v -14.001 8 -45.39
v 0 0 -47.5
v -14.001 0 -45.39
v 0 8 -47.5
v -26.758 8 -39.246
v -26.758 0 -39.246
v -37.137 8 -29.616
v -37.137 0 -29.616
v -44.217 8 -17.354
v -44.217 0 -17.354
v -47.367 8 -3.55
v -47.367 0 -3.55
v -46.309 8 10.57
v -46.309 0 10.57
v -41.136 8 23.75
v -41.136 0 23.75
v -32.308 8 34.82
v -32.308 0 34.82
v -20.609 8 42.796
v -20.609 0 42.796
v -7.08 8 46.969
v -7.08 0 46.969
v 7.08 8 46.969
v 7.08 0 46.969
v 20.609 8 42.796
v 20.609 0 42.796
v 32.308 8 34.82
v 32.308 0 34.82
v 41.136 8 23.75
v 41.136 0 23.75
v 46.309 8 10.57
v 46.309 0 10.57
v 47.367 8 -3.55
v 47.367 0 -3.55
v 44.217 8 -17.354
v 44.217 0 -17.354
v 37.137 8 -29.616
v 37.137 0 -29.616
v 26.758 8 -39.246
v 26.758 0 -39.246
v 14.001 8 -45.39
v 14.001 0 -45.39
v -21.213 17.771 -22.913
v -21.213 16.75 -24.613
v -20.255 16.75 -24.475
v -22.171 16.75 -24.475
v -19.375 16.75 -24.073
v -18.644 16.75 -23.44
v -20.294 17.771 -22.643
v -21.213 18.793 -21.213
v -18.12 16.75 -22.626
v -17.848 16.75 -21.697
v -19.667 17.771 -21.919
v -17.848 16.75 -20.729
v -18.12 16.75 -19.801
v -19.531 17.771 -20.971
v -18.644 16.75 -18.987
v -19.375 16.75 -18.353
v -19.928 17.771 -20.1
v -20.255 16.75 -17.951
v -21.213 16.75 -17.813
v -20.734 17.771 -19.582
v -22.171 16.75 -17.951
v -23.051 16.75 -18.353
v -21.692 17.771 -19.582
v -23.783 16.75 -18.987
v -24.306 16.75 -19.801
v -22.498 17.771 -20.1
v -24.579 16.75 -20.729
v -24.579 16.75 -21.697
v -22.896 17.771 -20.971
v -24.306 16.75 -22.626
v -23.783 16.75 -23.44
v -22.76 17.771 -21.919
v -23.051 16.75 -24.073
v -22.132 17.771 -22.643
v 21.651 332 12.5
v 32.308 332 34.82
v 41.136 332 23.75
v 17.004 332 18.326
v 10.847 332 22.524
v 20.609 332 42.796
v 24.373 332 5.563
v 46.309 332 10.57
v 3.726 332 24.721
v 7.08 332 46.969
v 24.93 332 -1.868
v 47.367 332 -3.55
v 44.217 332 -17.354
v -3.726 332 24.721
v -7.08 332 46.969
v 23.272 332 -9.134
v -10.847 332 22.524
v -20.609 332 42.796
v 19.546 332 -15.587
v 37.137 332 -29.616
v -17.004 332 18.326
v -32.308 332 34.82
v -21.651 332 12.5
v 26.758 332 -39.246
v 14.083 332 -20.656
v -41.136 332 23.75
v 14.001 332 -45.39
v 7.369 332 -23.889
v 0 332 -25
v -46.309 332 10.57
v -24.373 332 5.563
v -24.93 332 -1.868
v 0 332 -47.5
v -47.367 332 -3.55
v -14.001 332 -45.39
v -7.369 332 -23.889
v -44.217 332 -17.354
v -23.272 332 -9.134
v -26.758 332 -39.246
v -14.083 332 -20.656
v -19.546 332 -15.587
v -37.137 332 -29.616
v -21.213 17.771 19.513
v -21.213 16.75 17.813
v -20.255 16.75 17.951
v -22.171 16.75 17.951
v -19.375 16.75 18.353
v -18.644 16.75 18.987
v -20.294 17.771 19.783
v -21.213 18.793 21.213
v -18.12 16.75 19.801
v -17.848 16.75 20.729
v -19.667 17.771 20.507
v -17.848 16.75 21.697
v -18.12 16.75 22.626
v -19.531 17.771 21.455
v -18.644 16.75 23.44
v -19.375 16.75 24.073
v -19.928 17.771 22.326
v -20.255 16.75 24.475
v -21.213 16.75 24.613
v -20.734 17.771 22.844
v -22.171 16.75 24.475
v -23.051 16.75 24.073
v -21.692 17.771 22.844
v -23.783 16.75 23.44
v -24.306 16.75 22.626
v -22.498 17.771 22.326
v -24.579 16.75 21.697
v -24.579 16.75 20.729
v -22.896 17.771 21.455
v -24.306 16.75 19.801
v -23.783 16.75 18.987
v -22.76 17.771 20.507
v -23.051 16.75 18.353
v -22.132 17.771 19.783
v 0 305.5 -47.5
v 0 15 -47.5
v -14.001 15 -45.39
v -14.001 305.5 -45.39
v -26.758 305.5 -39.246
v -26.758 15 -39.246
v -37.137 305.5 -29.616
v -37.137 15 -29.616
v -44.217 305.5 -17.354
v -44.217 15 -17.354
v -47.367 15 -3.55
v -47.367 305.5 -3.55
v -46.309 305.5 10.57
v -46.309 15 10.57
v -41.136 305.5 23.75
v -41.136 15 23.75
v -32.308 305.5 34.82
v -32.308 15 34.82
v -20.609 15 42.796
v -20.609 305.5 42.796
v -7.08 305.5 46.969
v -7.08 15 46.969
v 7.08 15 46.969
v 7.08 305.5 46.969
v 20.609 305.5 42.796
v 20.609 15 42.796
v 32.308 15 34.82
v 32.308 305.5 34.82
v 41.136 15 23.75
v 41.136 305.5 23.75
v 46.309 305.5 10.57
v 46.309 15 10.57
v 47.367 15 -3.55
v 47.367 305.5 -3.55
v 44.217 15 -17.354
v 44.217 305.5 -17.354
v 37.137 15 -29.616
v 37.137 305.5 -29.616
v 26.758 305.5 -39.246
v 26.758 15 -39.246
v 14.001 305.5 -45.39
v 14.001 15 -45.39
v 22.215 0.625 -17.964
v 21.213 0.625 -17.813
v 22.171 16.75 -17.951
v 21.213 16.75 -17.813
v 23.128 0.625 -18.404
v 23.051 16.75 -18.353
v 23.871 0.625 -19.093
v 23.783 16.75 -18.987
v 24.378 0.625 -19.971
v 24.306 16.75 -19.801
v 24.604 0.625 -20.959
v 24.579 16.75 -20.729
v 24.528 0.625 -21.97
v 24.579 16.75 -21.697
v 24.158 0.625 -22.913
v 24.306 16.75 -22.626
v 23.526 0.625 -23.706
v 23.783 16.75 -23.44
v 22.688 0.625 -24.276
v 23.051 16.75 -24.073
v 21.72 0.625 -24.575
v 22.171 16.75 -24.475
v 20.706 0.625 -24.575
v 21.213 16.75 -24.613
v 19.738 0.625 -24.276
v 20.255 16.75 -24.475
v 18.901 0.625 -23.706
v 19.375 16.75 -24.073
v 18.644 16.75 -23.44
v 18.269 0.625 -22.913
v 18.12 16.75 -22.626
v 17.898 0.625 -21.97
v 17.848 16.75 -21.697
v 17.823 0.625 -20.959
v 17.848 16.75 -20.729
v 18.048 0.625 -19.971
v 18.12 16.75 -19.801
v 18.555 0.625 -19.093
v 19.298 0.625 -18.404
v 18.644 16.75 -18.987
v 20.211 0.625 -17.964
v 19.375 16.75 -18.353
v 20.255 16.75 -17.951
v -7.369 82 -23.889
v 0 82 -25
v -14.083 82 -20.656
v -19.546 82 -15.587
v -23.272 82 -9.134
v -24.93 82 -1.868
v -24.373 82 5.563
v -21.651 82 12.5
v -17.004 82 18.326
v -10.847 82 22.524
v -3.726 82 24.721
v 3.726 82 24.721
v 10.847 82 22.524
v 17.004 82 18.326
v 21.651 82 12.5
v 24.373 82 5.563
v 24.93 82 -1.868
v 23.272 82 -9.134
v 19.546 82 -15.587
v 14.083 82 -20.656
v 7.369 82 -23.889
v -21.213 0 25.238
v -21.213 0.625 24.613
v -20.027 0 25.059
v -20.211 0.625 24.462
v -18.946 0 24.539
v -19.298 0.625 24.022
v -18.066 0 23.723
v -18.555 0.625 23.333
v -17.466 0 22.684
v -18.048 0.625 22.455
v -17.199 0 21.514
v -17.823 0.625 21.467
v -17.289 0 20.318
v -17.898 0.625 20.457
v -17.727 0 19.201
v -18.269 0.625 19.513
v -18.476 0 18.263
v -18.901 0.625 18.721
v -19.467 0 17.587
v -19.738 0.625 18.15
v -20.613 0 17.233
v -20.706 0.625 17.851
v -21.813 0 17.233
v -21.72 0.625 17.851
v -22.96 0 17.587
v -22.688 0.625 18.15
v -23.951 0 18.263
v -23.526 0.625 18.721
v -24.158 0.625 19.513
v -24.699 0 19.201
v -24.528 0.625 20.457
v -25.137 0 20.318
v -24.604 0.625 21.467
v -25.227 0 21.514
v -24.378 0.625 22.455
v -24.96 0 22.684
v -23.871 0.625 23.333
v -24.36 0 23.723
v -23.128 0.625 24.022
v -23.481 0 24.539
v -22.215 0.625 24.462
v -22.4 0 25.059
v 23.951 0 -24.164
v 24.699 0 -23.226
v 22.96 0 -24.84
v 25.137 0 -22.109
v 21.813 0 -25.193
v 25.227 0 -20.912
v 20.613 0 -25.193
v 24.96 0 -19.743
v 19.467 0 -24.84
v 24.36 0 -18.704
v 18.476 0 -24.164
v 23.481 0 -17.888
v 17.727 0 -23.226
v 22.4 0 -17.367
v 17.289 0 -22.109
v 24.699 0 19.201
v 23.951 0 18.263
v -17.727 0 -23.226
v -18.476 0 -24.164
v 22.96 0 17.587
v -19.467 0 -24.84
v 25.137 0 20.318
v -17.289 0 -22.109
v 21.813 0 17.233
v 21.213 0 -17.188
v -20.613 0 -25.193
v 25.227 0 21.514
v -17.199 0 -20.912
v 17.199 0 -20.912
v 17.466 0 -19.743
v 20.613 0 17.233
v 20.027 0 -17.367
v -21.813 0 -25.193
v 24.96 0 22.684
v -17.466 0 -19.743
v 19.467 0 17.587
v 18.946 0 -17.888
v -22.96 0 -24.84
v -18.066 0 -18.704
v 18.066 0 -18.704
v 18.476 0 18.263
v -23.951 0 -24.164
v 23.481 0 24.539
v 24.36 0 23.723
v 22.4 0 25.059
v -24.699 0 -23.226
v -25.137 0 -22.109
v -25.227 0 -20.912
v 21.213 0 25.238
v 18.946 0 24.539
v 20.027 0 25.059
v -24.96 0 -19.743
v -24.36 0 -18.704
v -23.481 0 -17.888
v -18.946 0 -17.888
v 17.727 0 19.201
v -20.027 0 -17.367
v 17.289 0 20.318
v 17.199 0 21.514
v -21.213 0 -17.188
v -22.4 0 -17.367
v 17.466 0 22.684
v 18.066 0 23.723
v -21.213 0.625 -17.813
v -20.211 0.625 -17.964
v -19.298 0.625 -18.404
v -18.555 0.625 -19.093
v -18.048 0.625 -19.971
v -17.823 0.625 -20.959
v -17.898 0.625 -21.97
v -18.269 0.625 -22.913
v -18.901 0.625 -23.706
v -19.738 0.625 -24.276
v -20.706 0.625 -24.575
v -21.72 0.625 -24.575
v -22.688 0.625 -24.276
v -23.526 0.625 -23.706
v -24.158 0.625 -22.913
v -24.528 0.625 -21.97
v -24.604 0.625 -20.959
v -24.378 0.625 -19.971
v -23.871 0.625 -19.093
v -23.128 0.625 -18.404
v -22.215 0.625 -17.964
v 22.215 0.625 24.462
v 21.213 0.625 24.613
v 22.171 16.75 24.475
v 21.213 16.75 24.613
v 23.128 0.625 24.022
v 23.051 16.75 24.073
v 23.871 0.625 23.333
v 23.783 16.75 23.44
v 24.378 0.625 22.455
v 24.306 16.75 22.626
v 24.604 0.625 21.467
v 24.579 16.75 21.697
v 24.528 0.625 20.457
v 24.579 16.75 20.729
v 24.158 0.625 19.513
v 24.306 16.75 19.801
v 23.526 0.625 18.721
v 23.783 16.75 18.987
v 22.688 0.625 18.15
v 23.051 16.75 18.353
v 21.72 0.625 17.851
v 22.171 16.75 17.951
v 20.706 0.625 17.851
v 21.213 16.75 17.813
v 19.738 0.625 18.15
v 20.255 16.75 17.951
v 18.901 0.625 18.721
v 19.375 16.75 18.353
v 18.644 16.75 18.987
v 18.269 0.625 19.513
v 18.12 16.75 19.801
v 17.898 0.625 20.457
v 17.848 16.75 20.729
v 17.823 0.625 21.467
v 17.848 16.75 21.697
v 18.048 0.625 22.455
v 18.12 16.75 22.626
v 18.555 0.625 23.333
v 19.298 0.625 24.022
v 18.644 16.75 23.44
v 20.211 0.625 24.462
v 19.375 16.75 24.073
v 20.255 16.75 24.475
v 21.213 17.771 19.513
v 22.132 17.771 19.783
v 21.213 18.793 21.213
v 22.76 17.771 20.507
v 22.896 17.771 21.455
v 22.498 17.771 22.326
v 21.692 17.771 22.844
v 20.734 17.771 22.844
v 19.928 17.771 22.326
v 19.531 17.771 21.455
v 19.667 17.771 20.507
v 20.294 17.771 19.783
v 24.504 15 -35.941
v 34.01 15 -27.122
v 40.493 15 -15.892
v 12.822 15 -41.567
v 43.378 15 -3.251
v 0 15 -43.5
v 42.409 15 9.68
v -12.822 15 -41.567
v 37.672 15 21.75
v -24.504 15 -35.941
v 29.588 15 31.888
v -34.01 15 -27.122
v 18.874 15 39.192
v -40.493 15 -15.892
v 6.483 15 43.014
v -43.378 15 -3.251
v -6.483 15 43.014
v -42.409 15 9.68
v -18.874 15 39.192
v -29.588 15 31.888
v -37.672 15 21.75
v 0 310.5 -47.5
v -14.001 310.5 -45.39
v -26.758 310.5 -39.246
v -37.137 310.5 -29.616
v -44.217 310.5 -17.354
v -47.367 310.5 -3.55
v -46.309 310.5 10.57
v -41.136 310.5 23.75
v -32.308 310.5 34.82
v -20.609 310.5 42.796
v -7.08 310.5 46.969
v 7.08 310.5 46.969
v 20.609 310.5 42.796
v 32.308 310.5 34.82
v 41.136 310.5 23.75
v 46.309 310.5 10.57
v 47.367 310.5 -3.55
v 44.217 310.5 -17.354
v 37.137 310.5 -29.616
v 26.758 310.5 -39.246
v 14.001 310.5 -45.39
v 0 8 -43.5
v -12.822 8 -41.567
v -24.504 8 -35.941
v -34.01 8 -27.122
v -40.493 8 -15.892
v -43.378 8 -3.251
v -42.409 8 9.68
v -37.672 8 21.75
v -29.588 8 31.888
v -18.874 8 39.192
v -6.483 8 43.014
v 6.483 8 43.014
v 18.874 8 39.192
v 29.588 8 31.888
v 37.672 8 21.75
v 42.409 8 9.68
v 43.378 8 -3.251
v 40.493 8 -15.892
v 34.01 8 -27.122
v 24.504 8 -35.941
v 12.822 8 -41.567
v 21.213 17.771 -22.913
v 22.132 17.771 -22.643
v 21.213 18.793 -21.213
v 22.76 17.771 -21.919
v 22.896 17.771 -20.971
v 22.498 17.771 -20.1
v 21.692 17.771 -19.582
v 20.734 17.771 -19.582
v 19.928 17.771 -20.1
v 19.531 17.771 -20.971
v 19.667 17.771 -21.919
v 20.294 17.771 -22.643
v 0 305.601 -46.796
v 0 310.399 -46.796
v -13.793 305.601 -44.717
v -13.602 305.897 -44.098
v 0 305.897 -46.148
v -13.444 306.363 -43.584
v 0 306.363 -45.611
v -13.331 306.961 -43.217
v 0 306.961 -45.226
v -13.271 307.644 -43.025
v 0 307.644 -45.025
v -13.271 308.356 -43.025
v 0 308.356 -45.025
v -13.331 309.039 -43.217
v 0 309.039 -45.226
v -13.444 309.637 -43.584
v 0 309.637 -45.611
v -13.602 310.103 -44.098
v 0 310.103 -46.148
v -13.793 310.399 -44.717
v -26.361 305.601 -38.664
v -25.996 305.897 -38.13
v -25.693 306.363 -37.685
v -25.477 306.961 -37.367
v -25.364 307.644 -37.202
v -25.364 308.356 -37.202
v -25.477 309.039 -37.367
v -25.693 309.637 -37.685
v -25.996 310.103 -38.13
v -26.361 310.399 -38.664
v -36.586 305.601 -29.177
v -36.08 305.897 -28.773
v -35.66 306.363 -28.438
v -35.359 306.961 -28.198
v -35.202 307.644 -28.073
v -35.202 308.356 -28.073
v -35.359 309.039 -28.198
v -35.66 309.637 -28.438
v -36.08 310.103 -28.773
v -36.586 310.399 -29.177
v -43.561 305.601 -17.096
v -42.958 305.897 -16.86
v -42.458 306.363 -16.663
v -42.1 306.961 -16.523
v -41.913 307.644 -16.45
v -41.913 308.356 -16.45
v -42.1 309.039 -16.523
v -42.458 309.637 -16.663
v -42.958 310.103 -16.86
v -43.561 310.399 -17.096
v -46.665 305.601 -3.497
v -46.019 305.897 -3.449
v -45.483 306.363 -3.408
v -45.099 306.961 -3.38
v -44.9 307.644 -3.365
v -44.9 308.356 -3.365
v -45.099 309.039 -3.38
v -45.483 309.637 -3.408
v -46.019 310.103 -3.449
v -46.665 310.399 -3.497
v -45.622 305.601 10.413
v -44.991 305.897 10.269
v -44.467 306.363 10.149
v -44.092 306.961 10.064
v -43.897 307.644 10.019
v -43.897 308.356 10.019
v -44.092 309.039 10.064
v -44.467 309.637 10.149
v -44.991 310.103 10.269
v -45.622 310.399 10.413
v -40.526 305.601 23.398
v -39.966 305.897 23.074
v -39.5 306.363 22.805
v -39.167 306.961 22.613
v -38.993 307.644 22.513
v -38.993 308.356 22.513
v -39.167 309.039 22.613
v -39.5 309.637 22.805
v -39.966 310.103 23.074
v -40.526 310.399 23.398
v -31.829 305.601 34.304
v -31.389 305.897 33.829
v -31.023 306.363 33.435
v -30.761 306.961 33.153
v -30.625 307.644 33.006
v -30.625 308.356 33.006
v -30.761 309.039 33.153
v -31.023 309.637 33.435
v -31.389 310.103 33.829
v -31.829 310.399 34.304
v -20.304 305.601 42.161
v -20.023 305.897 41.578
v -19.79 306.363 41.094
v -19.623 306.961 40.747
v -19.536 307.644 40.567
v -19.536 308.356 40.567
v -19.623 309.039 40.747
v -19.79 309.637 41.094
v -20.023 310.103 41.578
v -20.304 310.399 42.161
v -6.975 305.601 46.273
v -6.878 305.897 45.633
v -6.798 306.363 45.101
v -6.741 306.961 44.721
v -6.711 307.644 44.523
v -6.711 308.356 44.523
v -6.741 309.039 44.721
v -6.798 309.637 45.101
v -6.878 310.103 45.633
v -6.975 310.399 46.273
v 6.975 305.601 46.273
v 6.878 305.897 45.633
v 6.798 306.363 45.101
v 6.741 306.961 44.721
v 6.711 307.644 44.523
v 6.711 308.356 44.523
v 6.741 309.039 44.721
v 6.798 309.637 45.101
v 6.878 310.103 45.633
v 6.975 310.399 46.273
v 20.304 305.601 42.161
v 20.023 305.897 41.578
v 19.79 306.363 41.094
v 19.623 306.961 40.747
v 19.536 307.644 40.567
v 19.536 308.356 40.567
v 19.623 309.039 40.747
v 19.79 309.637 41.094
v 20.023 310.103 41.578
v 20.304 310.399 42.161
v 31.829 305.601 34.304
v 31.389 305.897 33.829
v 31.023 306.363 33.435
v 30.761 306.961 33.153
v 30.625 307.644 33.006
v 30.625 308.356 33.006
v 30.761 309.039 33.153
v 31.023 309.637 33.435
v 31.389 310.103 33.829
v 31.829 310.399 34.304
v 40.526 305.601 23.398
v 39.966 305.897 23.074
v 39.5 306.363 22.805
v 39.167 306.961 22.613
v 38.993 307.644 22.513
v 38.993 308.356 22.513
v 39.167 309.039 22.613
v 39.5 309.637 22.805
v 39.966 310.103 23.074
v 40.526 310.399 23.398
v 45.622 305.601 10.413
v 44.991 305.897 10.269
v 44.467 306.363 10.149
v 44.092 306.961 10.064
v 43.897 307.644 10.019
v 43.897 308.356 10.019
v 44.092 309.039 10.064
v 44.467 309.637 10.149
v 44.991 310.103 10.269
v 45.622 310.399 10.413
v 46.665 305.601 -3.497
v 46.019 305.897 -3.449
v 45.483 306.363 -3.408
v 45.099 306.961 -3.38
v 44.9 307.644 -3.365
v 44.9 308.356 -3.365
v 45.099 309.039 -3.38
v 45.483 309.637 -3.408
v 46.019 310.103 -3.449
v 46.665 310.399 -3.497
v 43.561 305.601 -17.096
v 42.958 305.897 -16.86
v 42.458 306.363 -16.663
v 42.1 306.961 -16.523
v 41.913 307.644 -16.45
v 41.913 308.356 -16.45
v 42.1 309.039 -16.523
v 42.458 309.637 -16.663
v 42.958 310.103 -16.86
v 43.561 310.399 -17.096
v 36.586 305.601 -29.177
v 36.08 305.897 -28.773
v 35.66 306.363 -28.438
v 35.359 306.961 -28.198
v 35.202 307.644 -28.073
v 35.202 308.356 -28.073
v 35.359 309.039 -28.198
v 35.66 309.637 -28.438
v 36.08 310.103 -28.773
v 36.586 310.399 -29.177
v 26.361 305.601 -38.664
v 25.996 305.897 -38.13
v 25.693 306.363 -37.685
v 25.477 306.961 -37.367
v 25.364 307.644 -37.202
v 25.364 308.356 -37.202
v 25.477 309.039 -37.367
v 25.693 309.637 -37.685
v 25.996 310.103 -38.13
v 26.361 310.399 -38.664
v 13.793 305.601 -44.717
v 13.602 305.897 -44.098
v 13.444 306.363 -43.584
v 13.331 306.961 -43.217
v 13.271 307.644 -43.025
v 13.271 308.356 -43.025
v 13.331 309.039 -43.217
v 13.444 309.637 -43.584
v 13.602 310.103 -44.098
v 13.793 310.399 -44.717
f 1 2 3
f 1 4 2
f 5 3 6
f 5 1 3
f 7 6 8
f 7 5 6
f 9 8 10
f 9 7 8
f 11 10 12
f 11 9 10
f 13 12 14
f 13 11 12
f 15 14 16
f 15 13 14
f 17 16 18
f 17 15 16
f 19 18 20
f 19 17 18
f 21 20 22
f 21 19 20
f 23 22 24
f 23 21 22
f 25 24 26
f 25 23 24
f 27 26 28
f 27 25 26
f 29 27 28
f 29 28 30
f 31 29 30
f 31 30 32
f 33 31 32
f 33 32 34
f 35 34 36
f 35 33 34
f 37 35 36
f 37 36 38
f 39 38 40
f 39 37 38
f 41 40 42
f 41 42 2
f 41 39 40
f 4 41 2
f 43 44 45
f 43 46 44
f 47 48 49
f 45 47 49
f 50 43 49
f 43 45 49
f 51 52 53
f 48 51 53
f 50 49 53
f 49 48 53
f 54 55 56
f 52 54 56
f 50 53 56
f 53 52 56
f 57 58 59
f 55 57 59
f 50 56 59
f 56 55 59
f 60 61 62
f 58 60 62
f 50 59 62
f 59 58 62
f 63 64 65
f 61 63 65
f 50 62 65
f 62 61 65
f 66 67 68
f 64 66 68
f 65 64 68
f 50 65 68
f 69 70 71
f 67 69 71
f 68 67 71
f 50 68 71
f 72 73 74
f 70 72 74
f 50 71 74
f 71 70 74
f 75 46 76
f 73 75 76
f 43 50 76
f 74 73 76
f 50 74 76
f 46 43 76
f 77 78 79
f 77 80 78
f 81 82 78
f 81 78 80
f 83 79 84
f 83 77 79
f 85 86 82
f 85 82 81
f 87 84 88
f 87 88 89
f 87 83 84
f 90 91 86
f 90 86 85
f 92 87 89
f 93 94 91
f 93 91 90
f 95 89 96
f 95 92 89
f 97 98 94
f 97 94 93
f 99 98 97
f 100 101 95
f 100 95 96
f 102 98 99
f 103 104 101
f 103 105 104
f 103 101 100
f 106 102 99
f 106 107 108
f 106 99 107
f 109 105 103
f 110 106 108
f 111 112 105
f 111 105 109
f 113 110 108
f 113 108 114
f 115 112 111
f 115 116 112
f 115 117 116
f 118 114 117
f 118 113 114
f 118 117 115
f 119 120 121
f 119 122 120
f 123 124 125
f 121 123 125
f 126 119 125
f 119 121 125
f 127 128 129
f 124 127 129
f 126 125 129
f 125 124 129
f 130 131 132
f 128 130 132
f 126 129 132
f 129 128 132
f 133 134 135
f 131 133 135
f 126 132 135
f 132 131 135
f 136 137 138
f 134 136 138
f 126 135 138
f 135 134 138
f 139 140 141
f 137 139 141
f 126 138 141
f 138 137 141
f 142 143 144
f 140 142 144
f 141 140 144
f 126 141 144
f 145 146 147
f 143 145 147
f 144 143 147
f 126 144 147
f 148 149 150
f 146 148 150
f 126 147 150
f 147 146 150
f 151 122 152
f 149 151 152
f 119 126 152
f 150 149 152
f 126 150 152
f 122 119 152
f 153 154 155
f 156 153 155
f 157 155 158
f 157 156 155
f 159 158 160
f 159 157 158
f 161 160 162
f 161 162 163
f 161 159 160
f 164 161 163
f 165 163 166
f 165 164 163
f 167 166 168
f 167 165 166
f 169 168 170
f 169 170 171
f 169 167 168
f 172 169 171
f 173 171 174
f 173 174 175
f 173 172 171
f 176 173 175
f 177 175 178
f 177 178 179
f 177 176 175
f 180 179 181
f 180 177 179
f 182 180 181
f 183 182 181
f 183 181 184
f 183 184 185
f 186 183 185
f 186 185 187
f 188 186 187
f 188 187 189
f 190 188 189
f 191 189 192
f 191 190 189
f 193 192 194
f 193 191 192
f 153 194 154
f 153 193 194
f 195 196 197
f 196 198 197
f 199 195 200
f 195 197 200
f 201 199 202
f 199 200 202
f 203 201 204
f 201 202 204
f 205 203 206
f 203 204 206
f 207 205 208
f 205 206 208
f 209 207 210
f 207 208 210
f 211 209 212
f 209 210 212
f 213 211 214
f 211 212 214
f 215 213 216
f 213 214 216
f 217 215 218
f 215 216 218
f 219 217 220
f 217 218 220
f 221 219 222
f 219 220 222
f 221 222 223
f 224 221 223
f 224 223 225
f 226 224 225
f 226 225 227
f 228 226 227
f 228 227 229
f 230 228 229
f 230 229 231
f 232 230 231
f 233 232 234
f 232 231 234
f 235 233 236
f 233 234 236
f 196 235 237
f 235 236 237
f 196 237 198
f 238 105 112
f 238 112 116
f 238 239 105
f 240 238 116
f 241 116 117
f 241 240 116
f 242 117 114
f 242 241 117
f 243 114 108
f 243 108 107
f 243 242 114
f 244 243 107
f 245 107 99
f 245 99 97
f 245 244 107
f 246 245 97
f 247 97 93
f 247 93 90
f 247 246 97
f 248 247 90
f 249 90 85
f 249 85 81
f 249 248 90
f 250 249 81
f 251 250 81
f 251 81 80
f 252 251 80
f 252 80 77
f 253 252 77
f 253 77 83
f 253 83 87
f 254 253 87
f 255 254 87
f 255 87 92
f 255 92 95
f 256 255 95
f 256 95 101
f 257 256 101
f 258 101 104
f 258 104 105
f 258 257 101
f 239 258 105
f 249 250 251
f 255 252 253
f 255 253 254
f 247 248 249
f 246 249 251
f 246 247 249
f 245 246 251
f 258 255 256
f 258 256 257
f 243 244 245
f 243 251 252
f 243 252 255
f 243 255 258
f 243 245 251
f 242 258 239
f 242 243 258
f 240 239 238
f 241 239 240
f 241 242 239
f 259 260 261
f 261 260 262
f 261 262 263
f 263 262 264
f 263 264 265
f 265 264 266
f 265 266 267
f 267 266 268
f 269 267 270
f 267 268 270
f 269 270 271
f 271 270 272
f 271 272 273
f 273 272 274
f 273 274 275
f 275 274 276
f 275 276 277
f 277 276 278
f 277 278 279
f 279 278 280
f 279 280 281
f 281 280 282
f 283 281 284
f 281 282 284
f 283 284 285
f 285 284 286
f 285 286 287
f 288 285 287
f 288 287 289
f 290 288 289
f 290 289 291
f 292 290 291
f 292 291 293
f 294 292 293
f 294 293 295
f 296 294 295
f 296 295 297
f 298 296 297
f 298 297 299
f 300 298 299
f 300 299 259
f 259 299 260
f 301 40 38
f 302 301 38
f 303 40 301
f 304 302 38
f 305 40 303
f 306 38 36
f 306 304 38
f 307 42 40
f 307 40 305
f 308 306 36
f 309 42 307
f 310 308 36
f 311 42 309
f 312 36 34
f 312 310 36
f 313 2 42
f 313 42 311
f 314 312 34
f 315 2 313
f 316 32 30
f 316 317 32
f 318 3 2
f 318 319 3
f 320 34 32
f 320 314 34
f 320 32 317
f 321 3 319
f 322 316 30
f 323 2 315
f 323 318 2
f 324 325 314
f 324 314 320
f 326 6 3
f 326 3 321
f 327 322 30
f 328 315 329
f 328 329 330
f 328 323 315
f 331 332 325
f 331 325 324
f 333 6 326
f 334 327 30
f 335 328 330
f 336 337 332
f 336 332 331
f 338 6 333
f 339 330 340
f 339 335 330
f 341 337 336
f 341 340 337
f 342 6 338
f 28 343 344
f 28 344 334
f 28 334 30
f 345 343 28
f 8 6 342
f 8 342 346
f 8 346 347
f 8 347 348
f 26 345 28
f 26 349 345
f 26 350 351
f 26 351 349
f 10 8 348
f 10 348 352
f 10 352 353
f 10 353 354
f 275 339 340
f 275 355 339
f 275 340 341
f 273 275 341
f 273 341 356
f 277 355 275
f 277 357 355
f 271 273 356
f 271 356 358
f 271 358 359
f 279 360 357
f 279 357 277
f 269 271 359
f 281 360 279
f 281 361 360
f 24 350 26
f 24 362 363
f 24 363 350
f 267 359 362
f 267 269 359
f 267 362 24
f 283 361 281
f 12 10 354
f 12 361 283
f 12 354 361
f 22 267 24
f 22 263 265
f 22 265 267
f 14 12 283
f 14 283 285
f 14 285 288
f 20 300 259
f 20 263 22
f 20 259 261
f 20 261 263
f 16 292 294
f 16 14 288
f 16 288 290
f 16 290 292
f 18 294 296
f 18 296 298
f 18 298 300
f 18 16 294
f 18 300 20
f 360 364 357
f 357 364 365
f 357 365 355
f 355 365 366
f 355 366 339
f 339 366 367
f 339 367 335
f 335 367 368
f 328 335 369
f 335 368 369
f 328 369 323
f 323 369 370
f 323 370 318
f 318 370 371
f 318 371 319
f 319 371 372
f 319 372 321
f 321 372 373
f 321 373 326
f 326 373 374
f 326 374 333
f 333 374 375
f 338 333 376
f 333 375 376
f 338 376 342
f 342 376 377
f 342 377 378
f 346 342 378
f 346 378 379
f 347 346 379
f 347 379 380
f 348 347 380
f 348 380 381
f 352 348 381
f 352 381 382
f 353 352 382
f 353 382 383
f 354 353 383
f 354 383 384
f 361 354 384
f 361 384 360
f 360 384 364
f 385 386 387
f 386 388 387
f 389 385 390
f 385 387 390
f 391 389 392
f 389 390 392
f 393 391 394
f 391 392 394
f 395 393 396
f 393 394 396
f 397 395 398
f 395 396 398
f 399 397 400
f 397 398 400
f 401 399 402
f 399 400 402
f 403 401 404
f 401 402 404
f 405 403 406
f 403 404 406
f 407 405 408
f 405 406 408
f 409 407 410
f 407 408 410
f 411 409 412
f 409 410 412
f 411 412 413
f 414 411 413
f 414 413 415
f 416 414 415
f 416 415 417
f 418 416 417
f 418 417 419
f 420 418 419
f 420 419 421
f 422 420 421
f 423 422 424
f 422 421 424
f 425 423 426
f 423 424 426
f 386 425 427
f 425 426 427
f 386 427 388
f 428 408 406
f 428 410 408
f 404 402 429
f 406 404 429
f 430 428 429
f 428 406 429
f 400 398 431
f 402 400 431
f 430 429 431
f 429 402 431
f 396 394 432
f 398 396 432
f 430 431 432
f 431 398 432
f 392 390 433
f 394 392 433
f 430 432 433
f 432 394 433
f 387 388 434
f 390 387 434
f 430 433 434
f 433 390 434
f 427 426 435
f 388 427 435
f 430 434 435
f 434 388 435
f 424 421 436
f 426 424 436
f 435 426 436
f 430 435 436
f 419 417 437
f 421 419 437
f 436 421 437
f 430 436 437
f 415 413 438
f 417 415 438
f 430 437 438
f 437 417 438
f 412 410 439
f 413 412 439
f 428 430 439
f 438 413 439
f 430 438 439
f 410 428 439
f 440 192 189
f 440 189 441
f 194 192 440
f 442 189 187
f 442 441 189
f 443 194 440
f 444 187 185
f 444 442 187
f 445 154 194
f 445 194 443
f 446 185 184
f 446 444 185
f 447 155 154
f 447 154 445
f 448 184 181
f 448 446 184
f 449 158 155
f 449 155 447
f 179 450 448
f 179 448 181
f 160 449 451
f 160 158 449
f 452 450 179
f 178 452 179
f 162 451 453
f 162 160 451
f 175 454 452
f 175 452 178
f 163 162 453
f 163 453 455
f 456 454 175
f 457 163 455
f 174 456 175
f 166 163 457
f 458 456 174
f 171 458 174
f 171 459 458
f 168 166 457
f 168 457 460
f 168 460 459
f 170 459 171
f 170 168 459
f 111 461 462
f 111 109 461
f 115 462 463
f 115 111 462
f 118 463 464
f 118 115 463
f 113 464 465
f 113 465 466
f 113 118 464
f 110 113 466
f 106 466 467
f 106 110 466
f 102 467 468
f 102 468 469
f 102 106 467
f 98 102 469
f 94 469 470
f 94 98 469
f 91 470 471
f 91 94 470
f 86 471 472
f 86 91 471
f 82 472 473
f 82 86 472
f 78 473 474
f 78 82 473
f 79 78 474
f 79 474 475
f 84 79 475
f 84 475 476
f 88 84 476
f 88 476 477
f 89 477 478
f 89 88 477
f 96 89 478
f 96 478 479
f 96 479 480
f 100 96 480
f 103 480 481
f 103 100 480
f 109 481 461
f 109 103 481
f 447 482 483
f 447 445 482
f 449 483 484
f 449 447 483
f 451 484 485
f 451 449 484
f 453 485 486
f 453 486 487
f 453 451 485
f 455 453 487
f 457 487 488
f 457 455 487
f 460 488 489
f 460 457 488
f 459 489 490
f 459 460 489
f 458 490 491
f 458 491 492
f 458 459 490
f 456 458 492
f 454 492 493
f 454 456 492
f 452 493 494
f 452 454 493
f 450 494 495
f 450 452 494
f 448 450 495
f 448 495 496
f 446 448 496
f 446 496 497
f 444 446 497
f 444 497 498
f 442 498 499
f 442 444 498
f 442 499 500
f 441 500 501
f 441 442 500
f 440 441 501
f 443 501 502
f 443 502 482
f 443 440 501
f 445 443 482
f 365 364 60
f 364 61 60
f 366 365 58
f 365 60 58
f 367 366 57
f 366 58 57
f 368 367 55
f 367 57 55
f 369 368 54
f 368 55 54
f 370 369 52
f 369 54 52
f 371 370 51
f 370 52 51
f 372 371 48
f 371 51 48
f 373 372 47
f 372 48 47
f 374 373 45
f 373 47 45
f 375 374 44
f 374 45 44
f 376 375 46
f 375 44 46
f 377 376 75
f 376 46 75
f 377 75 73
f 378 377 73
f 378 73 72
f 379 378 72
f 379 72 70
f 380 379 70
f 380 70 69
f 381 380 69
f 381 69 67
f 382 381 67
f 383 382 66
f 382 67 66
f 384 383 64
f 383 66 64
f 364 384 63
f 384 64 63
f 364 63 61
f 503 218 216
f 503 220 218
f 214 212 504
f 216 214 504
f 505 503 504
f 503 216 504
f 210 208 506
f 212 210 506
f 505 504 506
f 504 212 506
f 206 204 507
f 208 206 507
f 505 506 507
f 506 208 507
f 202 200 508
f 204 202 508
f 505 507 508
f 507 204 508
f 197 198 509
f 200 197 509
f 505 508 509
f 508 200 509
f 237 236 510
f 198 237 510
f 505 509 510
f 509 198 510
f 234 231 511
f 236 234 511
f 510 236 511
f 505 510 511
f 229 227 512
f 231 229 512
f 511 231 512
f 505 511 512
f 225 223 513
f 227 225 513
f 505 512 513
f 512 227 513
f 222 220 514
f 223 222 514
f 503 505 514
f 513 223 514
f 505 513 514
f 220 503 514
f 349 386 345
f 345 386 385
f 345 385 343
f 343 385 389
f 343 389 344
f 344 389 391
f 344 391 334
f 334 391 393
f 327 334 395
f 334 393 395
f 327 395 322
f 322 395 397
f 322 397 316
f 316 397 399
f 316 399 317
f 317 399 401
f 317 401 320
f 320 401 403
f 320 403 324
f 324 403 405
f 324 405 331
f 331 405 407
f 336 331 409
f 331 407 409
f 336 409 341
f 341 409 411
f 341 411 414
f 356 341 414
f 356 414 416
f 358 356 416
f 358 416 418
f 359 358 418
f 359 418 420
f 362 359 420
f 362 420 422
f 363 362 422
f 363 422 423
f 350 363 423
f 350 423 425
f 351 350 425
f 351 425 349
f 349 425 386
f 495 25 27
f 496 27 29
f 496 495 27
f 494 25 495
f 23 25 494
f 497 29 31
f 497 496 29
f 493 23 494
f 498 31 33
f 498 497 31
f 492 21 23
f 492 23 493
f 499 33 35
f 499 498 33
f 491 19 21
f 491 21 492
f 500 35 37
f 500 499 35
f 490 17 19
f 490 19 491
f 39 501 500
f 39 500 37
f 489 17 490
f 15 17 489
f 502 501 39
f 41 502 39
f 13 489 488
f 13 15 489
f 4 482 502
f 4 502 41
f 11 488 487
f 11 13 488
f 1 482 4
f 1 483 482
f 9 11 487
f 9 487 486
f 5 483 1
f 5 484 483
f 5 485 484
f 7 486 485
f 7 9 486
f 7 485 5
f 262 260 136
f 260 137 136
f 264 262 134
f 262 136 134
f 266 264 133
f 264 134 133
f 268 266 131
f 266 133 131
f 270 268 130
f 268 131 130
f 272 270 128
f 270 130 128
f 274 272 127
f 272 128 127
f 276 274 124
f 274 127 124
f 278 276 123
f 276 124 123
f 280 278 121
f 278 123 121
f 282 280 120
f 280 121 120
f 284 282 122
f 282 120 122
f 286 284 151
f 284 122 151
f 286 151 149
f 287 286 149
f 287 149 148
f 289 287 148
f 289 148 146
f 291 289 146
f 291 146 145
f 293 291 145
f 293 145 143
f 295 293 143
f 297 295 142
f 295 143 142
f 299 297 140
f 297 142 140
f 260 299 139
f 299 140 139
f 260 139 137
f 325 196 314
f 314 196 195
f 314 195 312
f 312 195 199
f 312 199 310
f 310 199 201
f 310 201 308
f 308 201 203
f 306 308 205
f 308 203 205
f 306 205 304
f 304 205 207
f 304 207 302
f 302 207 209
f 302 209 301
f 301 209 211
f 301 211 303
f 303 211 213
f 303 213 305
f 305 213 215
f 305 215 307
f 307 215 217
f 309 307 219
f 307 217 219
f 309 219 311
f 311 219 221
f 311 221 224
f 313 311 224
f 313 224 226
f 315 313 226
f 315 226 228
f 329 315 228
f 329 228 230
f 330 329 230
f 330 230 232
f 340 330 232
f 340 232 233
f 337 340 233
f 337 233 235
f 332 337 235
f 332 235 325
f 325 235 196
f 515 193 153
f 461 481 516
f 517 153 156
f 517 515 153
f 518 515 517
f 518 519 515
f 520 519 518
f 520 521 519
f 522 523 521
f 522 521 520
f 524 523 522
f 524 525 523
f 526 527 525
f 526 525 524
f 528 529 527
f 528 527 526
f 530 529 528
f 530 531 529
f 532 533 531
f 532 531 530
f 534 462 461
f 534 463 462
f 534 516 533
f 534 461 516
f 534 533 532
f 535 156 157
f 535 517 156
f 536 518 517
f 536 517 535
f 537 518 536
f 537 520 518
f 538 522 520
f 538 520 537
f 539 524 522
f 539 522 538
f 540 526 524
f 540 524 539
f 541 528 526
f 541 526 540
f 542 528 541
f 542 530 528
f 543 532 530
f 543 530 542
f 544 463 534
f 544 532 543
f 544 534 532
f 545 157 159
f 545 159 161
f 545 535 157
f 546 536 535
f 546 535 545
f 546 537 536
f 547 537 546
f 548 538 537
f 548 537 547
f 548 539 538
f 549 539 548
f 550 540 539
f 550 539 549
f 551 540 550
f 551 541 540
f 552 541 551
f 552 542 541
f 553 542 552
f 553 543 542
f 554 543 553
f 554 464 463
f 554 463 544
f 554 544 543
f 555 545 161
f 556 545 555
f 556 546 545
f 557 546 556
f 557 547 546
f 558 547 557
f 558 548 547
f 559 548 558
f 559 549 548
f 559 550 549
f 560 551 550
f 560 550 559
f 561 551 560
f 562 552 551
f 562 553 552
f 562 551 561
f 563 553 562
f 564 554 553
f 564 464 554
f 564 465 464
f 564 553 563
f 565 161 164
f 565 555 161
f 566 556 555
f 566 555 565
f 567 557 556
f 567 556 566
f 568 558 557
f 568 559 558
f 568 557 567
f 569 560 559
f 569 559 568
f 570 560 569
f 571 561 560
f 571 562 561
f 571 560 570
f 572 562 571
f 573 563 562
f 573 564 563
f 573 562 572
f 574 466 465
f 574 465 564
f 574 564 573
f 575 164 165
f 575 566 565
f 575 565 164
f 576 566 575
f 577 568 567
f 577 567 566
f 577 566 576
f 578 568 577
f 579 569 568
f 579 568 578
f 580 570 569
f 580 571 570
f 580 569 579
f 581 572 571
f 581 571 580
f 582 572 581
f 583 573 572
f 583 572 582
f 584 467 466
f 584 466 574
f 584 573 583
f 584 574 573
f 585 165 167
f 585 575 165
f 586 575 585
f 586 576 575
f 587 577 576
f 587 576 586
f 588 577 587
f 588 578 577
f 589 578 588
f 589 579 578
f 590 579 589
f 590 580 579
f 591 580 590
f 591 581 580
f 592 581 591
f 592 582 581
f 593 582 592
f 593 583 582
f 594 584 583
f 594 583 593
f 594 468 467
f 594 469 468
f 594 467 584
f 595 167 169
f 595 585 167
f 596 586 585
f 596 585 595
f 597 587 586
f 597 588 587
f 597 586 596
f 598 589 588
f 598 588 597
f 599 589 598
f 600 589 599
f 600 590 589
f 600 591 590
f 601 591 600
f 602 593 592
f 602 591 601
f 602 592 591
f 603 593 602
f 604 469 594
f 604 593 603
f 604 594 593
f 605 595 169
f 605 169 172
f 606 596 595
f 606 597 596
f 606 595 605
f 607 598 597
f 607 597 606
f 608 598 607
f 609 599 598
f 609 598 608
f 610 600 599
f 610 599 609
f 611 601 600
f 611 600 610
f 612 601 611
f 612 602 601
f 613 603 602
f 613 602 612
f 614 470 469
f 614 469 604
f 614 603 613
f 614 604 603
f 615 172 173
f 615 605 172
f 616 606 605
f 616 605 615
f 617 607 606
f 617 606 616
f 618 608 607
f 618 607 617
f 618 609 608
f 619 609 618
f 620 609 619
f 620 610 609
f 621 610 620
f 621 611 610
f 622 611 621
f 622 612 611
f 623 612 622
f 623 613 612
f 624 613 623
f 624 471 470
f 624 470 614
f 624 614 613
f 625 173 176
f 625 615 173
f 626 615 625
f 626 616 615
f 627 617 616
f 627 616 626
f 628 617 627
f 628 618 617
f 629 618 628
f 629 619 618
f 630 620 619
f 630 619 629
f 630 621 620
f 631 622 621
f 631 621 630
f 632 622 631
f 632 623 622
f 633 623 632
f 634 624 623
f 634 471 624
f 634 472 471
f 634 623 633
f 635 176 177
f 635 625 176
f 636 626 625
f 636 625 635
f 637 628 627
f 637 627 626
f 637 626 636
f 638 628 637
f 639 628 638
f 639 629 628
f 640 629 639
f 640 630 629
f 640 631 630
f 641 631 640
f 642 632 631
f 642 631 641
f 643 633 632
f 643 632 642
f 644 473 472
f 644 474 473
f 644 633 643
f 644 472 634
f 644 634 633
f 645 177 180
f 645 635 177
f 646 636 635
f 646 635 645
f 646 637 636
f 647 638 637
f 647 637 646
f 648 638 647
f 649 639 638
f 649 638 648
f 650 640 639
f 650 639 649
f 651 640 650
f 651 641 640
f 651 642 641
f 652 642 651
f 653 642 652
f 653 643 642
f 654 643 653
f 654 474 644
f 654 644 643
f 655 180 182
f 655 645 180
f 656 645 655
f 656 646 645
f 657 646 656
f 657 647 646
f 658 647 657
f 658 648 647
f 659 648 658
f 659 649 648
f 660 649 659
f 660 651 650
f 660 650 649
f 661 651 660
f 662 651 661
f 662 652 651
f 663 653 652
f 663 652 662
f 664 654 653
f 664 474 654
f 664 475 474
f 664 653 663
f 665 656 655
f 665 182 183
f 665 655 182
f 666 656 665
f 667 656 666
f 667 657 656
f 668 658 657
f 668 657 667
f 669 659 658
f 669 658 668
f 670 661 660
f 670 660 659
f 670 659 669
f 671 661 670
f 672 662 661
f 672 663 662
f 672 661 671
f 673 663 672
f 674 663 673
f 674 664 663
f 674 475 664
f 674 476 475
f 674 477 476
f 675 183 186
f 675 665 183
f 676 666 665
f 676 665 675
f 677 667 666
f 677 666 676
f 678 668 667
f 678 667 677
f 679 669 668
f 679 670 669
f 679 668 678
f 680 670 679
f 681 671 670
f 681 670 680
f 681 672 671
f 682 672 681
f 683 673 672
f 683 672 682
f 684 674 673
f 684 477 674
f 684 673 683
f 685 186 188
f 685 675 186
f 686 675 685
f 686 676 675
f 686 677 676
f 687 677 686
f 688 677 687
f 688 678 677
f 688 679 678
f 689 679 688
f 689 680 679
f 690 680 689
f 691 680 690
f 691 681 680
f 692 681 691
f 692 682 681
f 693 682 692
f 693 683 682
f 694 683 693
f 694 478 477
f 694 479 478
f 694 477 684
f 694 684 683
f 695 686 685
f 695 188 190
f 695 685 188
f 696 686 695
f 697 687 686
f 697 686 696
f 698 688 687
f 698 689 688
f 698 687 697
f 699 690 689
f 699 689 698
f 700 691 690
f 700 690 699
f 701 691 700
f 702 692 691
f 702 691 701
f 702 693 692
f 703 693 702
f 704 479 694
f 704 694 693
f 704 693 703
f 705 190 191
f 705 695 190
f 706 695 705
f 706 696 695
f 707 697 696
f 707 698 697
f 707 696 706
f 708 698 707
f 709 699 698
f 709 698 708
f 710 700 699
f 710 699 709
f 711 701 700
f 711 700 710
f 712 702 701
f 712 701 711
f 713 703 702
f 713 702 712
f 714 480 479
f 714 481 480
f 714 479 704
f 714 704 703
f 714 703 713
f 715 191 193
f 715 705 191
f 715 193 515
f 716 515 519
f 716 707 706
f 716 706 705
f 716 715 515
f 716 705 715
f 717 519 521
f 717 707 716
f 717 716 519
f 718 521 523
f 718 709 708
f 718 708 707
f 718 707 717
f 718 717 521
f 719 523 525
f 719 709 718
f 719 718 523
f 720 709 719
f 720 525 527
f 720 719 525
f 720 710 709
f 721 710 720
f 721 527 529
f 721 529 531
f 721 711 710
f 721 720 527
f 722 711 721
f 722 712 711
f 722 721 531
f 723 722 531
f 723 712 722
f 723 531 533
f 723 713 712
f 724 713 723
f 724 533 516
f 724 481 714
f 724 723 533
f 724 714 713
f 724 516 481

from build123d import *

# Parameters (mm, degrees)
M8_TAPPED_HOLE1_D           = 6.8
M8_TAPPED_HOLE1_DEPTH       = 16.75
M8_TAPPED_HOLE1_CSINK_D     = 8.05
M8_TAPPED_HOLE1_CSINK_ANGLE = 90
M8_TAPPED_HOLE1_TIP         = 2.042926105


with BuildPart() as part:
    # Sketch1 → Revolve1 (revolve)
    with BuildSketch(Plane.XY, mode=Mode.PRIVATE) as revolve1_sk:
        with BuildLine():
            Line((0, 0), (47.5, 0))
            Line((47.5, 0), (47.5, 8))
            Line((47.5, 8), (43.5, 8))
            Line((43.5, 8), (43.5, 15))
            Line((43.5, 15), (47.5, 15))
            Line((47.5, 15), (47.5, 305.5))
            ThreePointArc((47.5, 305.5), (45, 308), (47.5, 310.5))
            Line((47.5, 310.5), (47.5, 332))
            Line((47.5, 332), (25, 332))
            Line((25, 332), (25, 82))
            Line((25, 82), (0, 82))
            Line((0, 82), (0, 0))
        make_face()
    revolve(revolve1_sk.sketch.rotate(Axis((0, 0, 0), (0, 1, 0)), 90), axis=Axis((0, 0, 0), (0, 1, 0)))

    # M8 Tapped Hole1
    with Locations(Plane(origin=(21.213203436, 0, 21.213203436), x_dir=(0, 0, -1), z_dir=(0, -1, 0))):
        with Locations((0, 0), (0, -42.426406872), (42.426406872, -42.426406872), (42.426406872, 0)):
            CounterSinkHole(M8_TAPPED_HOLE1_D / 2, M8_TAPPED_HOLE1_CSINK_D / 2, depth=M8_TAPPED_HOLE1_DEPTH, counter_sink_angle=M8_TAPPED_HOLE1_CSINK_ANGLE)
            with Locations((0, 0, -(M8_TAPPED_HOLE1_DEPTH + M8_TAPPED_HOLE1_TIP / 2))):  # 118° drill point
                Cone(0, M8_TAPPED_HOLE1_D / 2, M8_TAPPED_HOLE1_TIP, mode=Mode.SUBTRACT)


solid = part.part
